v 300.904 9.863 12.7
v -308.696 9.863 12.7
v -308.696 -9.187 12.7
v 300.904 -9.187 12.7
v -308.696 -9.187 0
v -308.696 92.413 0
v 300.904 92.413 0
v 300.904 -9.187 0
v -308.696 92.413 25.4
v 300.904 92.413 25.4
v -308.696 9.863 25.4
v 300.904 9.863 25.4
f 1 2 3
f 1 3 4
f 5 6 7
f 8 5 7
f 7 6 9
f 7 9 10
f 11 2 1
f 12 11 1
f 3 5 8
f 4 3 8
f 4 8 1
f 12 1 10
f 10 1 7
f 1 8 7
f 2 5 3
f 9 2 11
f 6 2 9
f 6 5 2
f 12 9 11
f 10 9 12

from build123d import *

# Parameters (mm, degrees)
F0_W      = 609.6
F0_H      = 82.55
F1_DEPTH  = 12.7
F0_H_2    = 19.05
F1_FACE_W = 609.6
F1_FACE_H = 82.55
F2_DEPTH  = 12.7


with BuildPart() as f1:
    # F0 (on Top) → F1 (new body)
    with BuildSketch(Plane.XY):
        with Locations((-3.896274, 51.138431)):
            Rectangle(F0_W, F0_H)
    extrude(amount=F1_DEPTH)

    # F0 (on Top) + F1_face (on face) → F2 (join)
    with BuildSketch(Plane.XY):
        with Locations((-3.896274, 51.138431)):
            Rectangle(F0_W, F0_H)
        with Locations((-3.896274, 0.338431)):
            Rectangle(F0_W, F0_H_2)
    with BuildSketch(Plane(origin=(-3.896274, 51.138431, 12.7), x_dir=(1, 0, 0), z_dir=(0, 0, 1))):
        Rectangle(F1_FACE_W, F1_FACE_H)
    extrude(amount=F2_DEPTH)


solid = f1.part
